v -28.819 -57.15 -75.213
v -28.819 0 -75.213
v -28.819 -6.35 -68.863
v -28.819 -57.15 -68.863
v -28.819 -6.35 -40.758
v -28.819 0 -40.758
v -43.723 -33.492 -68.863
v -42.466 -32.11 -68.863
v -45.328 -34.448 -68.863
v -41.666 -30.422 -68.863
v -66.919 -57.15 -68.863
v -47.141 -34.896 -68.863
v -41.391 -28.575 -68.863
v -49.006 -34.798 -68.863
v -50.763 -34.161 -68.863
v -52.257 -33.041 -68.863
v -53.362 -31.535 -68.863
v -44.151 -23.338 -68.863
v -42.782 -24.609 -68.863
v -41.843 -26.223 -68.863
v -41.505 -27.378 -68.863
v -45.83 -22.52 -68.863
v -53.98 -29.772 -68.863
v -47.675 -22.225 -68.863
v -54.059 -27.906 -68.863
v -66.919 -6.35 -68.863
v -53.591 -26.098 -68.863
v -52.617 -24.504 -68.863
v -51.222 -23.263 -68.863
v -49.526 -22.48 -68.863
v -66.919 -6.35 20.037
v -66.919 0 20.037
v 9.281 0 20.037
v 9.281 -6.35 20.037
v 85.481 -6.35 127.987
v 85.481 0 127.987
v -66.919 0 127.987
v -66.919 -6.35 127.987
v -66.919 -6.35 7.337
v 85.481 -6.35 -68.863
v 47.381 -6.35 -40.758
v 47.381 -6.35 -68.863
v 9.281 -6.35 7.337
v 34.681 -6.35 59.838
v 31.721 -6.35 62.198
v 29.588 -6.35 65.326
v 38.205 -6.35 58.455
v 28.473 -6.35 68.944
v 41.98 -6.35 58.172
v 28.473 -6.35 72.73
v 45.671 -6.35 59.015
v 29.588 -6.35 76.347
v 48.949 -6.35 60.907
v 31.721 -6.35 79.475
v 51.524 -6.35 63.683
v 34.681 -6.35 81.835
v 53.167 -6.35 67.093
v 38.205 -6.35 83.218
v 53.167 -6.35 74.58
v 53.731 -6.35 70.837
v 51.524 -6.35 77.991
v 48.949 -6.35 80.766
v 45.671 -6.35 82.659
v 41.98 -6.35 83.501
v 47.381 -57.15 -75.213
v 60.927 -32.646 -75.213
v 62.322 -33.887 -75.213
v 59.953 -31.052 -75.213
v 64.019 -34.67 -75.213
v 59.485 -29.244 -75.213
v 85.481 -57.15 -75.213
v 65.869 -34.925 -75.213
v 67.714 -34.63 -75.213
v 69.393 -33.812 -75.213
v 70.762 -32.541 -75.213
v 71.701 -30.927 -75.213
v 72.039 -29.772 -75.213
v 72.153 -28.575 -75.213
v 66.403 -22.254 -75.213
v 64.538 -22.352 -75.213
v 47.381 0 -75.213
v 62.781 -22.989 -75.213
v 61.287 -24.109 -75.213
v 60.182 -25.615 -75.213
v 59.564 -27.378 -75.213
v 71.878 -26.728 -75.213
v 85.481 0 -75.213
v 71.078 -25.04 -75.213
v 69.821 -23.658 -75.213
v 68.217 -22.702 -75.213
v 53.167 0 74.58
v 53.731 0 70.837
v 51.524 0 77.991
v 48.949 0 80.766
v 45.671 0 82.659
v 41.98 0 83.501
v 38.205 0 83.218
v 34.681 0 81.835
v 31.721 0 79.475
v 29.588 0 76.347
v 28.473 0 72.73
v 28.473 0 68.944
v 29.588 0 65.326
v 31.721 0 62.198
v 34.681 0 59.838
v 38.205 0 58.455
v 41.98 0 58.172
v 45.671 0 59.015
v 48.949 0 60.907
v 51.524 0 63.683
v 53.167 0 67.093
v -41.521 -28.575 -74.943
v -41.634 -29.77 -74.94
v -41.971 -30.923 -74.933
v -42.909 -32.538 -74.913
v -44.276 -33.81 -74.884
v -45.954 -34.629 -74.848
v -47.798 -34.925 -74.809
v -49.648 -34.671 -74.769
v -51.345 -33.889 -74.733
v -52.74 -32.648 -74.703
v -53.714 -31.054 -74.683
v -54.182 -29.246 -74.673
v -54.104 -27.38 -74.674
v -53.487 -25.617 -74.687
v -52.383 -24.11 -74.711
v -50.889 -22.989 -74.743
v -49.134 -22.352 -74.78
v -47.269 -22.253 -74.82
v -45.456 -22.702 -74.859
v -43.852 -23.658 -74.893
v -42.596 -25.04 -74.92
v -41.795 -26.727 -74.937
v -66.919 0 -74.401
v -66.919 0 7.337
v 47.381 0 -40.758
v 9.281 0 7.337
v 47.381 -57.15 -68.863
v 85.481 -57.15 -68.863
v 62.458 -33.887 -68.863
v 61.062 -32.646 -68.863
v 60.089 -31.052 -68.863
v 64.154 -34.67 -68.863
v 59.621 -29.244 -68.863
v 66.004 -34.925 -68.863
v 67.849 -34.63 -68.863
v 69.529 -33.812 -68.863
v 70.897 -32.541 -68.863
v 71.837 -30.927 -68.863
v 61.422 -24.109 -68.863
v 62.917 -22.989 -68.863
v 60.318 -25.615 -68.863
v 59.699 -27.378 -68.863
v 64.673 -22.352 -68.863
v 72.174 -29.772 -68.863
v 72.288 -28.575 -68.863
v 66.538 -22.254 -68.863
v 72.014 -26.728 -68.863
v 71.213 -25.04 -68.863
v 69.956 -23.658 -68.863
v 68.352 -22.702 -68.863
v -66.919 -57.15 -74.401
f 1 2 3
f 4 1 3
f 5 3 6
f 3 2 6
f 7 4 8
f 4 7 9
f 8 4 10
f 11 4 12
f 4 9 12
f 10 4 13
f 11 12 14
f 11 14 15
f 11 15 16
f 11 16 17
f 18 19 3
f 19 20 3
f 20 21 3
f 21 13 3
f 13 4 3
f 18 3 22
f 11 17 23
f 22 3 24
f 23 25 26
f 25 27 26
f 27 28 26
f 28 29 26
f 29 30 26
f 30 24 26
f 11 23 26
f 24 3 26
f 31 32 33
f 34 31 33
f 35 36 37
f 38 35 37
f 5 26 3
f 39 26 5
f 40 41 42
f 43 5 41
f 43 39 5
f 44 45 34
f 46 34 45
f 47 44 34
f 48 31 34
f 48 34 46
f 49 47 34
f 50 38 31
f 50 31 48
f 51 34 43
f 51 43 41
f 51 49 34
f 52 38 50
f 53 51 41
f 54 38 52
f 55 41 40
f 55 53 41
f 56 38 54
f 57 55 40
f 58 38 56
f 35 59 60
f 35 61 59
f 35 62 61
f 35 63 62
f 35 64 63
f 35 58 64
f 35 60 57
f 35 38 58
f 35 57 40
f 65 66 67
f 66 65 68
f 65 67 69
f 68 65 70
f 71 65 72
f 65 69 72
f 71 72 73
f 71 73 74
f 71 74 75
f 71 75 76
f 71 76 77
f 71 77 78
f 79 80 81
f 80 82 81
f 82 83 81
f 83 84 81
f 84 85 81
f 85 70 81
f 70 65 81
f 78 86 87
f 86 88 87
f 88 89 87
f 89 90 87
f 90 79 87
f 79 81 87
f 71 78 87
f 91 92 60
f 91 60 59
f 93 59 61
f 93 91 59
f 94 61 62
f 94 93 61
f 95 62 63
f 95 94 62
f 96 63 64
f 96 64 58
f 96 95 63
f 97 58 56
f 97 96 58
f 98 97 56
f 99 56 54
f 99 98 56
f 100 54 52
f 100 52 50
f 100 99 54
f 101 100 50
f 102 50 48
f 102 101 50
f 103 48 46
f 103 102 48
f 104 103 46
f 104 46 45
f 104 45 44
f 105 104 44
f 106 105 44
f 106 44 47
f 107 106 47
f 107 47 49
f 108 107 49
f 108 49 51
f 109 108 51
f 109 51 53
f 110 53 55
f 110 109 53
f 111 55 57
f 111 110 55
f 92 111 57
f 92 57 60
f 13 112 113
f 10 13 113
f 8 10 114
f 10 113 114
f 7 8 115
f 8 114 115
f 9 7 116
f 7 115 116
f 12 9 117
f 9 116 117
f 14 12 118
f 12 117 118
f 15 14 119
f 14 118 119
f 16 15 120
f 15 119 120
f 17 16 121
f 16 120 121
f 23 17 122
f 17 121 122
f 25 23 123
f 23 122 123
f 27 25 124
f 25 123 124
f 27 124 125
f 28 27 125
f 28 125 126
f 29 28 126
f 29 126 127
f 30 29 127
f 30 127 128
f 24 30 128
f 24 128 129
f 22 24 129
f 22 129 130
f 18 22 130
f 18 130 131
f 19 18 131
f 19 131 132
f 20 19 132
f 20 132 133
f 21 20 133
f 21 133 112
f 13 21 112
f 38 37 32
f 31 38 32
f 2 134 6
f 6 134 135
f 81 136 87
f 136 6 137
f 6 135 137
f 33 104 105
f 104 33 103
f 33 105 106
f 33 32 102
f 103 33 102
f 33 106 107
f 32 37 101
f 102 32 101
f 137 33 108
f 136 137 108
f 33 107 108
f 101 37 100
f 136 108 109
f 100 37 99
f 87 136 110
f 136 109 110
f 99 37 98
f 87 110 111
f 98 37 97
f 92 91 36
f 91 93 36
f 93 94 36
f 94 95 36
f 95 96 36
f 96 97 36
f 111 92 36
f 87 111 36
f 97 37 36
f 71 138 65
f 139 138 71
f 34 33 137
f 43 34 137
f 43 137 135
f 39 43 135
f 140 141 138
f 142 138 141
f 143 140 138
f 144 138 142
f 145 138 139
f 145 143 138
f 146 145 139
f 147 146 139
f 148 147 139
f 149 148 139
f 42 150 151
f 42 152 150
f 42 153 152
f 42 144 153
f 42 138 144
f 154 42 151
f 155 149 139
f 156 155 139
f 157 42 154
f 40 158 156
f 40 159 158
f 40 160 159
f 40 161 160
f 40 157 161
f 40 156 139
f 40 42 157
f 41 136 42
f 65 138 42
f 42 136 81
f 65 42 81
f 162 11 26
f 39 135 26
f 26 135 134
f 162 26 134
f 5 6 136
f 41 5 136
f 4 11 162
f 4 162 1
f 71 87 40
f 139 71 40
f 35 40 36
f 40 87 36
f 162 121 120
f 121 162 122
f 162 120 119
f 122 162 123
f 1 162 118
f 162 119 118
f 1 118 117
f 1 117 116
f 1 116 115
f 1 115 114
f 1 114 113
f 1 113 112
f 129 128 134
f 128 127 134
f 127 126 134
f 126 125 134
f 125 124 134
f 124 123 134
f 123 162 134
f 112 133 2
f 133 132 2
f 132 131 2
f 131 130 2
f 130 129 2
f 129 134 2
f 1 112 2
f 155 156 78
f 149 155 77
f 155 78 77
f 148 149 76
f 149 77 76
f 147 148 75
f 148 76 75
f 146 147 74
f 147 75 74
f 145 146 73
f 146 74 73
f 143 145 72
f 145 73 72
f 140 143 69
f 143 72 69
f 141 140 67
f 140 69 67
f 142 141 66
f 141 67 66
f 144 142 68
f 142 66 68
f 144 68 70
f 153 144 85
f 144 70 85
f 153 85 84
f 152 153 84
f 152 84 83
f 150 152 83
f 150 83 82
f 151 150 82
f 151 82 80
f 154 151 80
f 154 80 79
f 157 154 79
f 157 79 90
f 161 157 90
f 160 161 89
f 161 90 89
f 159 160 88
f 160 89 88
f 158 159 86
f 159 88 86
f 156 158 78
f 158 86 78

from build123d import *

# Parameters (mm, degrees)
F0_R     = 12.7
F1_DEPTH = 6.35
F2_W     = 38.1
F2_H     = 6.35
F3_DEPTH = 50.8
F4_R     = 6.35
F5_DEPTH = 25.4


with BuildPart() as f1:
    # F0 (on Front) → F1 (new body)
    with BuildSketch(Plane.XZ):
        Polygon((85.480769, 127.986667), (-66.919231, 127.986667), (-66.919231, 20.036667), (9.280769, 20.036667), (9.280769, 7.336667), (-66.919231, 7.336667), (-66.919231, -74.401039), (-28.819231, -75.213333), (-28.819231, -40.757814), (47.380769, -40.757814), (47.380769, -75.213333), (85.480769, -75.213333), align=None)
        with Locations((41.030769, 70.836667)):
            Circle(F0_R, mode=Mode.SUBTRACT)
    extrude(amount=F1_DEPTH)

    # F2 (on face) → F3 (join)
    with BuildSketch(Plane.XZ.offset(6.35)):
        Polygon((-28.819231, -68.863333), (-66.919231, -68.863333), (-66.919231, -74.401039), (-28.819231, -75.213333), align=None)
        with Locations((66.430769, -72.038333)):
            Rectangle(F2_W, F2_H)
    extrude(amount=F3_DEPTH)

    # F4 (on face) → F5 (cut)
    with BuildSketch(Plane(origin=(-1.615918, 0, -75.79331), x_dir=(0.999773, 0, -0.021315), z_dir=(-0.021315, 0, -0.999773))):
        with Locations((-46.263823, 28.575)):
            Circle(F4_R)
        with Locations((67.389801, 28.575)):
            Circle(F4_R)
    extrude(amount=-F5_DEPTH, mode=Mode.SUBTRACT)


solid = f1.part
